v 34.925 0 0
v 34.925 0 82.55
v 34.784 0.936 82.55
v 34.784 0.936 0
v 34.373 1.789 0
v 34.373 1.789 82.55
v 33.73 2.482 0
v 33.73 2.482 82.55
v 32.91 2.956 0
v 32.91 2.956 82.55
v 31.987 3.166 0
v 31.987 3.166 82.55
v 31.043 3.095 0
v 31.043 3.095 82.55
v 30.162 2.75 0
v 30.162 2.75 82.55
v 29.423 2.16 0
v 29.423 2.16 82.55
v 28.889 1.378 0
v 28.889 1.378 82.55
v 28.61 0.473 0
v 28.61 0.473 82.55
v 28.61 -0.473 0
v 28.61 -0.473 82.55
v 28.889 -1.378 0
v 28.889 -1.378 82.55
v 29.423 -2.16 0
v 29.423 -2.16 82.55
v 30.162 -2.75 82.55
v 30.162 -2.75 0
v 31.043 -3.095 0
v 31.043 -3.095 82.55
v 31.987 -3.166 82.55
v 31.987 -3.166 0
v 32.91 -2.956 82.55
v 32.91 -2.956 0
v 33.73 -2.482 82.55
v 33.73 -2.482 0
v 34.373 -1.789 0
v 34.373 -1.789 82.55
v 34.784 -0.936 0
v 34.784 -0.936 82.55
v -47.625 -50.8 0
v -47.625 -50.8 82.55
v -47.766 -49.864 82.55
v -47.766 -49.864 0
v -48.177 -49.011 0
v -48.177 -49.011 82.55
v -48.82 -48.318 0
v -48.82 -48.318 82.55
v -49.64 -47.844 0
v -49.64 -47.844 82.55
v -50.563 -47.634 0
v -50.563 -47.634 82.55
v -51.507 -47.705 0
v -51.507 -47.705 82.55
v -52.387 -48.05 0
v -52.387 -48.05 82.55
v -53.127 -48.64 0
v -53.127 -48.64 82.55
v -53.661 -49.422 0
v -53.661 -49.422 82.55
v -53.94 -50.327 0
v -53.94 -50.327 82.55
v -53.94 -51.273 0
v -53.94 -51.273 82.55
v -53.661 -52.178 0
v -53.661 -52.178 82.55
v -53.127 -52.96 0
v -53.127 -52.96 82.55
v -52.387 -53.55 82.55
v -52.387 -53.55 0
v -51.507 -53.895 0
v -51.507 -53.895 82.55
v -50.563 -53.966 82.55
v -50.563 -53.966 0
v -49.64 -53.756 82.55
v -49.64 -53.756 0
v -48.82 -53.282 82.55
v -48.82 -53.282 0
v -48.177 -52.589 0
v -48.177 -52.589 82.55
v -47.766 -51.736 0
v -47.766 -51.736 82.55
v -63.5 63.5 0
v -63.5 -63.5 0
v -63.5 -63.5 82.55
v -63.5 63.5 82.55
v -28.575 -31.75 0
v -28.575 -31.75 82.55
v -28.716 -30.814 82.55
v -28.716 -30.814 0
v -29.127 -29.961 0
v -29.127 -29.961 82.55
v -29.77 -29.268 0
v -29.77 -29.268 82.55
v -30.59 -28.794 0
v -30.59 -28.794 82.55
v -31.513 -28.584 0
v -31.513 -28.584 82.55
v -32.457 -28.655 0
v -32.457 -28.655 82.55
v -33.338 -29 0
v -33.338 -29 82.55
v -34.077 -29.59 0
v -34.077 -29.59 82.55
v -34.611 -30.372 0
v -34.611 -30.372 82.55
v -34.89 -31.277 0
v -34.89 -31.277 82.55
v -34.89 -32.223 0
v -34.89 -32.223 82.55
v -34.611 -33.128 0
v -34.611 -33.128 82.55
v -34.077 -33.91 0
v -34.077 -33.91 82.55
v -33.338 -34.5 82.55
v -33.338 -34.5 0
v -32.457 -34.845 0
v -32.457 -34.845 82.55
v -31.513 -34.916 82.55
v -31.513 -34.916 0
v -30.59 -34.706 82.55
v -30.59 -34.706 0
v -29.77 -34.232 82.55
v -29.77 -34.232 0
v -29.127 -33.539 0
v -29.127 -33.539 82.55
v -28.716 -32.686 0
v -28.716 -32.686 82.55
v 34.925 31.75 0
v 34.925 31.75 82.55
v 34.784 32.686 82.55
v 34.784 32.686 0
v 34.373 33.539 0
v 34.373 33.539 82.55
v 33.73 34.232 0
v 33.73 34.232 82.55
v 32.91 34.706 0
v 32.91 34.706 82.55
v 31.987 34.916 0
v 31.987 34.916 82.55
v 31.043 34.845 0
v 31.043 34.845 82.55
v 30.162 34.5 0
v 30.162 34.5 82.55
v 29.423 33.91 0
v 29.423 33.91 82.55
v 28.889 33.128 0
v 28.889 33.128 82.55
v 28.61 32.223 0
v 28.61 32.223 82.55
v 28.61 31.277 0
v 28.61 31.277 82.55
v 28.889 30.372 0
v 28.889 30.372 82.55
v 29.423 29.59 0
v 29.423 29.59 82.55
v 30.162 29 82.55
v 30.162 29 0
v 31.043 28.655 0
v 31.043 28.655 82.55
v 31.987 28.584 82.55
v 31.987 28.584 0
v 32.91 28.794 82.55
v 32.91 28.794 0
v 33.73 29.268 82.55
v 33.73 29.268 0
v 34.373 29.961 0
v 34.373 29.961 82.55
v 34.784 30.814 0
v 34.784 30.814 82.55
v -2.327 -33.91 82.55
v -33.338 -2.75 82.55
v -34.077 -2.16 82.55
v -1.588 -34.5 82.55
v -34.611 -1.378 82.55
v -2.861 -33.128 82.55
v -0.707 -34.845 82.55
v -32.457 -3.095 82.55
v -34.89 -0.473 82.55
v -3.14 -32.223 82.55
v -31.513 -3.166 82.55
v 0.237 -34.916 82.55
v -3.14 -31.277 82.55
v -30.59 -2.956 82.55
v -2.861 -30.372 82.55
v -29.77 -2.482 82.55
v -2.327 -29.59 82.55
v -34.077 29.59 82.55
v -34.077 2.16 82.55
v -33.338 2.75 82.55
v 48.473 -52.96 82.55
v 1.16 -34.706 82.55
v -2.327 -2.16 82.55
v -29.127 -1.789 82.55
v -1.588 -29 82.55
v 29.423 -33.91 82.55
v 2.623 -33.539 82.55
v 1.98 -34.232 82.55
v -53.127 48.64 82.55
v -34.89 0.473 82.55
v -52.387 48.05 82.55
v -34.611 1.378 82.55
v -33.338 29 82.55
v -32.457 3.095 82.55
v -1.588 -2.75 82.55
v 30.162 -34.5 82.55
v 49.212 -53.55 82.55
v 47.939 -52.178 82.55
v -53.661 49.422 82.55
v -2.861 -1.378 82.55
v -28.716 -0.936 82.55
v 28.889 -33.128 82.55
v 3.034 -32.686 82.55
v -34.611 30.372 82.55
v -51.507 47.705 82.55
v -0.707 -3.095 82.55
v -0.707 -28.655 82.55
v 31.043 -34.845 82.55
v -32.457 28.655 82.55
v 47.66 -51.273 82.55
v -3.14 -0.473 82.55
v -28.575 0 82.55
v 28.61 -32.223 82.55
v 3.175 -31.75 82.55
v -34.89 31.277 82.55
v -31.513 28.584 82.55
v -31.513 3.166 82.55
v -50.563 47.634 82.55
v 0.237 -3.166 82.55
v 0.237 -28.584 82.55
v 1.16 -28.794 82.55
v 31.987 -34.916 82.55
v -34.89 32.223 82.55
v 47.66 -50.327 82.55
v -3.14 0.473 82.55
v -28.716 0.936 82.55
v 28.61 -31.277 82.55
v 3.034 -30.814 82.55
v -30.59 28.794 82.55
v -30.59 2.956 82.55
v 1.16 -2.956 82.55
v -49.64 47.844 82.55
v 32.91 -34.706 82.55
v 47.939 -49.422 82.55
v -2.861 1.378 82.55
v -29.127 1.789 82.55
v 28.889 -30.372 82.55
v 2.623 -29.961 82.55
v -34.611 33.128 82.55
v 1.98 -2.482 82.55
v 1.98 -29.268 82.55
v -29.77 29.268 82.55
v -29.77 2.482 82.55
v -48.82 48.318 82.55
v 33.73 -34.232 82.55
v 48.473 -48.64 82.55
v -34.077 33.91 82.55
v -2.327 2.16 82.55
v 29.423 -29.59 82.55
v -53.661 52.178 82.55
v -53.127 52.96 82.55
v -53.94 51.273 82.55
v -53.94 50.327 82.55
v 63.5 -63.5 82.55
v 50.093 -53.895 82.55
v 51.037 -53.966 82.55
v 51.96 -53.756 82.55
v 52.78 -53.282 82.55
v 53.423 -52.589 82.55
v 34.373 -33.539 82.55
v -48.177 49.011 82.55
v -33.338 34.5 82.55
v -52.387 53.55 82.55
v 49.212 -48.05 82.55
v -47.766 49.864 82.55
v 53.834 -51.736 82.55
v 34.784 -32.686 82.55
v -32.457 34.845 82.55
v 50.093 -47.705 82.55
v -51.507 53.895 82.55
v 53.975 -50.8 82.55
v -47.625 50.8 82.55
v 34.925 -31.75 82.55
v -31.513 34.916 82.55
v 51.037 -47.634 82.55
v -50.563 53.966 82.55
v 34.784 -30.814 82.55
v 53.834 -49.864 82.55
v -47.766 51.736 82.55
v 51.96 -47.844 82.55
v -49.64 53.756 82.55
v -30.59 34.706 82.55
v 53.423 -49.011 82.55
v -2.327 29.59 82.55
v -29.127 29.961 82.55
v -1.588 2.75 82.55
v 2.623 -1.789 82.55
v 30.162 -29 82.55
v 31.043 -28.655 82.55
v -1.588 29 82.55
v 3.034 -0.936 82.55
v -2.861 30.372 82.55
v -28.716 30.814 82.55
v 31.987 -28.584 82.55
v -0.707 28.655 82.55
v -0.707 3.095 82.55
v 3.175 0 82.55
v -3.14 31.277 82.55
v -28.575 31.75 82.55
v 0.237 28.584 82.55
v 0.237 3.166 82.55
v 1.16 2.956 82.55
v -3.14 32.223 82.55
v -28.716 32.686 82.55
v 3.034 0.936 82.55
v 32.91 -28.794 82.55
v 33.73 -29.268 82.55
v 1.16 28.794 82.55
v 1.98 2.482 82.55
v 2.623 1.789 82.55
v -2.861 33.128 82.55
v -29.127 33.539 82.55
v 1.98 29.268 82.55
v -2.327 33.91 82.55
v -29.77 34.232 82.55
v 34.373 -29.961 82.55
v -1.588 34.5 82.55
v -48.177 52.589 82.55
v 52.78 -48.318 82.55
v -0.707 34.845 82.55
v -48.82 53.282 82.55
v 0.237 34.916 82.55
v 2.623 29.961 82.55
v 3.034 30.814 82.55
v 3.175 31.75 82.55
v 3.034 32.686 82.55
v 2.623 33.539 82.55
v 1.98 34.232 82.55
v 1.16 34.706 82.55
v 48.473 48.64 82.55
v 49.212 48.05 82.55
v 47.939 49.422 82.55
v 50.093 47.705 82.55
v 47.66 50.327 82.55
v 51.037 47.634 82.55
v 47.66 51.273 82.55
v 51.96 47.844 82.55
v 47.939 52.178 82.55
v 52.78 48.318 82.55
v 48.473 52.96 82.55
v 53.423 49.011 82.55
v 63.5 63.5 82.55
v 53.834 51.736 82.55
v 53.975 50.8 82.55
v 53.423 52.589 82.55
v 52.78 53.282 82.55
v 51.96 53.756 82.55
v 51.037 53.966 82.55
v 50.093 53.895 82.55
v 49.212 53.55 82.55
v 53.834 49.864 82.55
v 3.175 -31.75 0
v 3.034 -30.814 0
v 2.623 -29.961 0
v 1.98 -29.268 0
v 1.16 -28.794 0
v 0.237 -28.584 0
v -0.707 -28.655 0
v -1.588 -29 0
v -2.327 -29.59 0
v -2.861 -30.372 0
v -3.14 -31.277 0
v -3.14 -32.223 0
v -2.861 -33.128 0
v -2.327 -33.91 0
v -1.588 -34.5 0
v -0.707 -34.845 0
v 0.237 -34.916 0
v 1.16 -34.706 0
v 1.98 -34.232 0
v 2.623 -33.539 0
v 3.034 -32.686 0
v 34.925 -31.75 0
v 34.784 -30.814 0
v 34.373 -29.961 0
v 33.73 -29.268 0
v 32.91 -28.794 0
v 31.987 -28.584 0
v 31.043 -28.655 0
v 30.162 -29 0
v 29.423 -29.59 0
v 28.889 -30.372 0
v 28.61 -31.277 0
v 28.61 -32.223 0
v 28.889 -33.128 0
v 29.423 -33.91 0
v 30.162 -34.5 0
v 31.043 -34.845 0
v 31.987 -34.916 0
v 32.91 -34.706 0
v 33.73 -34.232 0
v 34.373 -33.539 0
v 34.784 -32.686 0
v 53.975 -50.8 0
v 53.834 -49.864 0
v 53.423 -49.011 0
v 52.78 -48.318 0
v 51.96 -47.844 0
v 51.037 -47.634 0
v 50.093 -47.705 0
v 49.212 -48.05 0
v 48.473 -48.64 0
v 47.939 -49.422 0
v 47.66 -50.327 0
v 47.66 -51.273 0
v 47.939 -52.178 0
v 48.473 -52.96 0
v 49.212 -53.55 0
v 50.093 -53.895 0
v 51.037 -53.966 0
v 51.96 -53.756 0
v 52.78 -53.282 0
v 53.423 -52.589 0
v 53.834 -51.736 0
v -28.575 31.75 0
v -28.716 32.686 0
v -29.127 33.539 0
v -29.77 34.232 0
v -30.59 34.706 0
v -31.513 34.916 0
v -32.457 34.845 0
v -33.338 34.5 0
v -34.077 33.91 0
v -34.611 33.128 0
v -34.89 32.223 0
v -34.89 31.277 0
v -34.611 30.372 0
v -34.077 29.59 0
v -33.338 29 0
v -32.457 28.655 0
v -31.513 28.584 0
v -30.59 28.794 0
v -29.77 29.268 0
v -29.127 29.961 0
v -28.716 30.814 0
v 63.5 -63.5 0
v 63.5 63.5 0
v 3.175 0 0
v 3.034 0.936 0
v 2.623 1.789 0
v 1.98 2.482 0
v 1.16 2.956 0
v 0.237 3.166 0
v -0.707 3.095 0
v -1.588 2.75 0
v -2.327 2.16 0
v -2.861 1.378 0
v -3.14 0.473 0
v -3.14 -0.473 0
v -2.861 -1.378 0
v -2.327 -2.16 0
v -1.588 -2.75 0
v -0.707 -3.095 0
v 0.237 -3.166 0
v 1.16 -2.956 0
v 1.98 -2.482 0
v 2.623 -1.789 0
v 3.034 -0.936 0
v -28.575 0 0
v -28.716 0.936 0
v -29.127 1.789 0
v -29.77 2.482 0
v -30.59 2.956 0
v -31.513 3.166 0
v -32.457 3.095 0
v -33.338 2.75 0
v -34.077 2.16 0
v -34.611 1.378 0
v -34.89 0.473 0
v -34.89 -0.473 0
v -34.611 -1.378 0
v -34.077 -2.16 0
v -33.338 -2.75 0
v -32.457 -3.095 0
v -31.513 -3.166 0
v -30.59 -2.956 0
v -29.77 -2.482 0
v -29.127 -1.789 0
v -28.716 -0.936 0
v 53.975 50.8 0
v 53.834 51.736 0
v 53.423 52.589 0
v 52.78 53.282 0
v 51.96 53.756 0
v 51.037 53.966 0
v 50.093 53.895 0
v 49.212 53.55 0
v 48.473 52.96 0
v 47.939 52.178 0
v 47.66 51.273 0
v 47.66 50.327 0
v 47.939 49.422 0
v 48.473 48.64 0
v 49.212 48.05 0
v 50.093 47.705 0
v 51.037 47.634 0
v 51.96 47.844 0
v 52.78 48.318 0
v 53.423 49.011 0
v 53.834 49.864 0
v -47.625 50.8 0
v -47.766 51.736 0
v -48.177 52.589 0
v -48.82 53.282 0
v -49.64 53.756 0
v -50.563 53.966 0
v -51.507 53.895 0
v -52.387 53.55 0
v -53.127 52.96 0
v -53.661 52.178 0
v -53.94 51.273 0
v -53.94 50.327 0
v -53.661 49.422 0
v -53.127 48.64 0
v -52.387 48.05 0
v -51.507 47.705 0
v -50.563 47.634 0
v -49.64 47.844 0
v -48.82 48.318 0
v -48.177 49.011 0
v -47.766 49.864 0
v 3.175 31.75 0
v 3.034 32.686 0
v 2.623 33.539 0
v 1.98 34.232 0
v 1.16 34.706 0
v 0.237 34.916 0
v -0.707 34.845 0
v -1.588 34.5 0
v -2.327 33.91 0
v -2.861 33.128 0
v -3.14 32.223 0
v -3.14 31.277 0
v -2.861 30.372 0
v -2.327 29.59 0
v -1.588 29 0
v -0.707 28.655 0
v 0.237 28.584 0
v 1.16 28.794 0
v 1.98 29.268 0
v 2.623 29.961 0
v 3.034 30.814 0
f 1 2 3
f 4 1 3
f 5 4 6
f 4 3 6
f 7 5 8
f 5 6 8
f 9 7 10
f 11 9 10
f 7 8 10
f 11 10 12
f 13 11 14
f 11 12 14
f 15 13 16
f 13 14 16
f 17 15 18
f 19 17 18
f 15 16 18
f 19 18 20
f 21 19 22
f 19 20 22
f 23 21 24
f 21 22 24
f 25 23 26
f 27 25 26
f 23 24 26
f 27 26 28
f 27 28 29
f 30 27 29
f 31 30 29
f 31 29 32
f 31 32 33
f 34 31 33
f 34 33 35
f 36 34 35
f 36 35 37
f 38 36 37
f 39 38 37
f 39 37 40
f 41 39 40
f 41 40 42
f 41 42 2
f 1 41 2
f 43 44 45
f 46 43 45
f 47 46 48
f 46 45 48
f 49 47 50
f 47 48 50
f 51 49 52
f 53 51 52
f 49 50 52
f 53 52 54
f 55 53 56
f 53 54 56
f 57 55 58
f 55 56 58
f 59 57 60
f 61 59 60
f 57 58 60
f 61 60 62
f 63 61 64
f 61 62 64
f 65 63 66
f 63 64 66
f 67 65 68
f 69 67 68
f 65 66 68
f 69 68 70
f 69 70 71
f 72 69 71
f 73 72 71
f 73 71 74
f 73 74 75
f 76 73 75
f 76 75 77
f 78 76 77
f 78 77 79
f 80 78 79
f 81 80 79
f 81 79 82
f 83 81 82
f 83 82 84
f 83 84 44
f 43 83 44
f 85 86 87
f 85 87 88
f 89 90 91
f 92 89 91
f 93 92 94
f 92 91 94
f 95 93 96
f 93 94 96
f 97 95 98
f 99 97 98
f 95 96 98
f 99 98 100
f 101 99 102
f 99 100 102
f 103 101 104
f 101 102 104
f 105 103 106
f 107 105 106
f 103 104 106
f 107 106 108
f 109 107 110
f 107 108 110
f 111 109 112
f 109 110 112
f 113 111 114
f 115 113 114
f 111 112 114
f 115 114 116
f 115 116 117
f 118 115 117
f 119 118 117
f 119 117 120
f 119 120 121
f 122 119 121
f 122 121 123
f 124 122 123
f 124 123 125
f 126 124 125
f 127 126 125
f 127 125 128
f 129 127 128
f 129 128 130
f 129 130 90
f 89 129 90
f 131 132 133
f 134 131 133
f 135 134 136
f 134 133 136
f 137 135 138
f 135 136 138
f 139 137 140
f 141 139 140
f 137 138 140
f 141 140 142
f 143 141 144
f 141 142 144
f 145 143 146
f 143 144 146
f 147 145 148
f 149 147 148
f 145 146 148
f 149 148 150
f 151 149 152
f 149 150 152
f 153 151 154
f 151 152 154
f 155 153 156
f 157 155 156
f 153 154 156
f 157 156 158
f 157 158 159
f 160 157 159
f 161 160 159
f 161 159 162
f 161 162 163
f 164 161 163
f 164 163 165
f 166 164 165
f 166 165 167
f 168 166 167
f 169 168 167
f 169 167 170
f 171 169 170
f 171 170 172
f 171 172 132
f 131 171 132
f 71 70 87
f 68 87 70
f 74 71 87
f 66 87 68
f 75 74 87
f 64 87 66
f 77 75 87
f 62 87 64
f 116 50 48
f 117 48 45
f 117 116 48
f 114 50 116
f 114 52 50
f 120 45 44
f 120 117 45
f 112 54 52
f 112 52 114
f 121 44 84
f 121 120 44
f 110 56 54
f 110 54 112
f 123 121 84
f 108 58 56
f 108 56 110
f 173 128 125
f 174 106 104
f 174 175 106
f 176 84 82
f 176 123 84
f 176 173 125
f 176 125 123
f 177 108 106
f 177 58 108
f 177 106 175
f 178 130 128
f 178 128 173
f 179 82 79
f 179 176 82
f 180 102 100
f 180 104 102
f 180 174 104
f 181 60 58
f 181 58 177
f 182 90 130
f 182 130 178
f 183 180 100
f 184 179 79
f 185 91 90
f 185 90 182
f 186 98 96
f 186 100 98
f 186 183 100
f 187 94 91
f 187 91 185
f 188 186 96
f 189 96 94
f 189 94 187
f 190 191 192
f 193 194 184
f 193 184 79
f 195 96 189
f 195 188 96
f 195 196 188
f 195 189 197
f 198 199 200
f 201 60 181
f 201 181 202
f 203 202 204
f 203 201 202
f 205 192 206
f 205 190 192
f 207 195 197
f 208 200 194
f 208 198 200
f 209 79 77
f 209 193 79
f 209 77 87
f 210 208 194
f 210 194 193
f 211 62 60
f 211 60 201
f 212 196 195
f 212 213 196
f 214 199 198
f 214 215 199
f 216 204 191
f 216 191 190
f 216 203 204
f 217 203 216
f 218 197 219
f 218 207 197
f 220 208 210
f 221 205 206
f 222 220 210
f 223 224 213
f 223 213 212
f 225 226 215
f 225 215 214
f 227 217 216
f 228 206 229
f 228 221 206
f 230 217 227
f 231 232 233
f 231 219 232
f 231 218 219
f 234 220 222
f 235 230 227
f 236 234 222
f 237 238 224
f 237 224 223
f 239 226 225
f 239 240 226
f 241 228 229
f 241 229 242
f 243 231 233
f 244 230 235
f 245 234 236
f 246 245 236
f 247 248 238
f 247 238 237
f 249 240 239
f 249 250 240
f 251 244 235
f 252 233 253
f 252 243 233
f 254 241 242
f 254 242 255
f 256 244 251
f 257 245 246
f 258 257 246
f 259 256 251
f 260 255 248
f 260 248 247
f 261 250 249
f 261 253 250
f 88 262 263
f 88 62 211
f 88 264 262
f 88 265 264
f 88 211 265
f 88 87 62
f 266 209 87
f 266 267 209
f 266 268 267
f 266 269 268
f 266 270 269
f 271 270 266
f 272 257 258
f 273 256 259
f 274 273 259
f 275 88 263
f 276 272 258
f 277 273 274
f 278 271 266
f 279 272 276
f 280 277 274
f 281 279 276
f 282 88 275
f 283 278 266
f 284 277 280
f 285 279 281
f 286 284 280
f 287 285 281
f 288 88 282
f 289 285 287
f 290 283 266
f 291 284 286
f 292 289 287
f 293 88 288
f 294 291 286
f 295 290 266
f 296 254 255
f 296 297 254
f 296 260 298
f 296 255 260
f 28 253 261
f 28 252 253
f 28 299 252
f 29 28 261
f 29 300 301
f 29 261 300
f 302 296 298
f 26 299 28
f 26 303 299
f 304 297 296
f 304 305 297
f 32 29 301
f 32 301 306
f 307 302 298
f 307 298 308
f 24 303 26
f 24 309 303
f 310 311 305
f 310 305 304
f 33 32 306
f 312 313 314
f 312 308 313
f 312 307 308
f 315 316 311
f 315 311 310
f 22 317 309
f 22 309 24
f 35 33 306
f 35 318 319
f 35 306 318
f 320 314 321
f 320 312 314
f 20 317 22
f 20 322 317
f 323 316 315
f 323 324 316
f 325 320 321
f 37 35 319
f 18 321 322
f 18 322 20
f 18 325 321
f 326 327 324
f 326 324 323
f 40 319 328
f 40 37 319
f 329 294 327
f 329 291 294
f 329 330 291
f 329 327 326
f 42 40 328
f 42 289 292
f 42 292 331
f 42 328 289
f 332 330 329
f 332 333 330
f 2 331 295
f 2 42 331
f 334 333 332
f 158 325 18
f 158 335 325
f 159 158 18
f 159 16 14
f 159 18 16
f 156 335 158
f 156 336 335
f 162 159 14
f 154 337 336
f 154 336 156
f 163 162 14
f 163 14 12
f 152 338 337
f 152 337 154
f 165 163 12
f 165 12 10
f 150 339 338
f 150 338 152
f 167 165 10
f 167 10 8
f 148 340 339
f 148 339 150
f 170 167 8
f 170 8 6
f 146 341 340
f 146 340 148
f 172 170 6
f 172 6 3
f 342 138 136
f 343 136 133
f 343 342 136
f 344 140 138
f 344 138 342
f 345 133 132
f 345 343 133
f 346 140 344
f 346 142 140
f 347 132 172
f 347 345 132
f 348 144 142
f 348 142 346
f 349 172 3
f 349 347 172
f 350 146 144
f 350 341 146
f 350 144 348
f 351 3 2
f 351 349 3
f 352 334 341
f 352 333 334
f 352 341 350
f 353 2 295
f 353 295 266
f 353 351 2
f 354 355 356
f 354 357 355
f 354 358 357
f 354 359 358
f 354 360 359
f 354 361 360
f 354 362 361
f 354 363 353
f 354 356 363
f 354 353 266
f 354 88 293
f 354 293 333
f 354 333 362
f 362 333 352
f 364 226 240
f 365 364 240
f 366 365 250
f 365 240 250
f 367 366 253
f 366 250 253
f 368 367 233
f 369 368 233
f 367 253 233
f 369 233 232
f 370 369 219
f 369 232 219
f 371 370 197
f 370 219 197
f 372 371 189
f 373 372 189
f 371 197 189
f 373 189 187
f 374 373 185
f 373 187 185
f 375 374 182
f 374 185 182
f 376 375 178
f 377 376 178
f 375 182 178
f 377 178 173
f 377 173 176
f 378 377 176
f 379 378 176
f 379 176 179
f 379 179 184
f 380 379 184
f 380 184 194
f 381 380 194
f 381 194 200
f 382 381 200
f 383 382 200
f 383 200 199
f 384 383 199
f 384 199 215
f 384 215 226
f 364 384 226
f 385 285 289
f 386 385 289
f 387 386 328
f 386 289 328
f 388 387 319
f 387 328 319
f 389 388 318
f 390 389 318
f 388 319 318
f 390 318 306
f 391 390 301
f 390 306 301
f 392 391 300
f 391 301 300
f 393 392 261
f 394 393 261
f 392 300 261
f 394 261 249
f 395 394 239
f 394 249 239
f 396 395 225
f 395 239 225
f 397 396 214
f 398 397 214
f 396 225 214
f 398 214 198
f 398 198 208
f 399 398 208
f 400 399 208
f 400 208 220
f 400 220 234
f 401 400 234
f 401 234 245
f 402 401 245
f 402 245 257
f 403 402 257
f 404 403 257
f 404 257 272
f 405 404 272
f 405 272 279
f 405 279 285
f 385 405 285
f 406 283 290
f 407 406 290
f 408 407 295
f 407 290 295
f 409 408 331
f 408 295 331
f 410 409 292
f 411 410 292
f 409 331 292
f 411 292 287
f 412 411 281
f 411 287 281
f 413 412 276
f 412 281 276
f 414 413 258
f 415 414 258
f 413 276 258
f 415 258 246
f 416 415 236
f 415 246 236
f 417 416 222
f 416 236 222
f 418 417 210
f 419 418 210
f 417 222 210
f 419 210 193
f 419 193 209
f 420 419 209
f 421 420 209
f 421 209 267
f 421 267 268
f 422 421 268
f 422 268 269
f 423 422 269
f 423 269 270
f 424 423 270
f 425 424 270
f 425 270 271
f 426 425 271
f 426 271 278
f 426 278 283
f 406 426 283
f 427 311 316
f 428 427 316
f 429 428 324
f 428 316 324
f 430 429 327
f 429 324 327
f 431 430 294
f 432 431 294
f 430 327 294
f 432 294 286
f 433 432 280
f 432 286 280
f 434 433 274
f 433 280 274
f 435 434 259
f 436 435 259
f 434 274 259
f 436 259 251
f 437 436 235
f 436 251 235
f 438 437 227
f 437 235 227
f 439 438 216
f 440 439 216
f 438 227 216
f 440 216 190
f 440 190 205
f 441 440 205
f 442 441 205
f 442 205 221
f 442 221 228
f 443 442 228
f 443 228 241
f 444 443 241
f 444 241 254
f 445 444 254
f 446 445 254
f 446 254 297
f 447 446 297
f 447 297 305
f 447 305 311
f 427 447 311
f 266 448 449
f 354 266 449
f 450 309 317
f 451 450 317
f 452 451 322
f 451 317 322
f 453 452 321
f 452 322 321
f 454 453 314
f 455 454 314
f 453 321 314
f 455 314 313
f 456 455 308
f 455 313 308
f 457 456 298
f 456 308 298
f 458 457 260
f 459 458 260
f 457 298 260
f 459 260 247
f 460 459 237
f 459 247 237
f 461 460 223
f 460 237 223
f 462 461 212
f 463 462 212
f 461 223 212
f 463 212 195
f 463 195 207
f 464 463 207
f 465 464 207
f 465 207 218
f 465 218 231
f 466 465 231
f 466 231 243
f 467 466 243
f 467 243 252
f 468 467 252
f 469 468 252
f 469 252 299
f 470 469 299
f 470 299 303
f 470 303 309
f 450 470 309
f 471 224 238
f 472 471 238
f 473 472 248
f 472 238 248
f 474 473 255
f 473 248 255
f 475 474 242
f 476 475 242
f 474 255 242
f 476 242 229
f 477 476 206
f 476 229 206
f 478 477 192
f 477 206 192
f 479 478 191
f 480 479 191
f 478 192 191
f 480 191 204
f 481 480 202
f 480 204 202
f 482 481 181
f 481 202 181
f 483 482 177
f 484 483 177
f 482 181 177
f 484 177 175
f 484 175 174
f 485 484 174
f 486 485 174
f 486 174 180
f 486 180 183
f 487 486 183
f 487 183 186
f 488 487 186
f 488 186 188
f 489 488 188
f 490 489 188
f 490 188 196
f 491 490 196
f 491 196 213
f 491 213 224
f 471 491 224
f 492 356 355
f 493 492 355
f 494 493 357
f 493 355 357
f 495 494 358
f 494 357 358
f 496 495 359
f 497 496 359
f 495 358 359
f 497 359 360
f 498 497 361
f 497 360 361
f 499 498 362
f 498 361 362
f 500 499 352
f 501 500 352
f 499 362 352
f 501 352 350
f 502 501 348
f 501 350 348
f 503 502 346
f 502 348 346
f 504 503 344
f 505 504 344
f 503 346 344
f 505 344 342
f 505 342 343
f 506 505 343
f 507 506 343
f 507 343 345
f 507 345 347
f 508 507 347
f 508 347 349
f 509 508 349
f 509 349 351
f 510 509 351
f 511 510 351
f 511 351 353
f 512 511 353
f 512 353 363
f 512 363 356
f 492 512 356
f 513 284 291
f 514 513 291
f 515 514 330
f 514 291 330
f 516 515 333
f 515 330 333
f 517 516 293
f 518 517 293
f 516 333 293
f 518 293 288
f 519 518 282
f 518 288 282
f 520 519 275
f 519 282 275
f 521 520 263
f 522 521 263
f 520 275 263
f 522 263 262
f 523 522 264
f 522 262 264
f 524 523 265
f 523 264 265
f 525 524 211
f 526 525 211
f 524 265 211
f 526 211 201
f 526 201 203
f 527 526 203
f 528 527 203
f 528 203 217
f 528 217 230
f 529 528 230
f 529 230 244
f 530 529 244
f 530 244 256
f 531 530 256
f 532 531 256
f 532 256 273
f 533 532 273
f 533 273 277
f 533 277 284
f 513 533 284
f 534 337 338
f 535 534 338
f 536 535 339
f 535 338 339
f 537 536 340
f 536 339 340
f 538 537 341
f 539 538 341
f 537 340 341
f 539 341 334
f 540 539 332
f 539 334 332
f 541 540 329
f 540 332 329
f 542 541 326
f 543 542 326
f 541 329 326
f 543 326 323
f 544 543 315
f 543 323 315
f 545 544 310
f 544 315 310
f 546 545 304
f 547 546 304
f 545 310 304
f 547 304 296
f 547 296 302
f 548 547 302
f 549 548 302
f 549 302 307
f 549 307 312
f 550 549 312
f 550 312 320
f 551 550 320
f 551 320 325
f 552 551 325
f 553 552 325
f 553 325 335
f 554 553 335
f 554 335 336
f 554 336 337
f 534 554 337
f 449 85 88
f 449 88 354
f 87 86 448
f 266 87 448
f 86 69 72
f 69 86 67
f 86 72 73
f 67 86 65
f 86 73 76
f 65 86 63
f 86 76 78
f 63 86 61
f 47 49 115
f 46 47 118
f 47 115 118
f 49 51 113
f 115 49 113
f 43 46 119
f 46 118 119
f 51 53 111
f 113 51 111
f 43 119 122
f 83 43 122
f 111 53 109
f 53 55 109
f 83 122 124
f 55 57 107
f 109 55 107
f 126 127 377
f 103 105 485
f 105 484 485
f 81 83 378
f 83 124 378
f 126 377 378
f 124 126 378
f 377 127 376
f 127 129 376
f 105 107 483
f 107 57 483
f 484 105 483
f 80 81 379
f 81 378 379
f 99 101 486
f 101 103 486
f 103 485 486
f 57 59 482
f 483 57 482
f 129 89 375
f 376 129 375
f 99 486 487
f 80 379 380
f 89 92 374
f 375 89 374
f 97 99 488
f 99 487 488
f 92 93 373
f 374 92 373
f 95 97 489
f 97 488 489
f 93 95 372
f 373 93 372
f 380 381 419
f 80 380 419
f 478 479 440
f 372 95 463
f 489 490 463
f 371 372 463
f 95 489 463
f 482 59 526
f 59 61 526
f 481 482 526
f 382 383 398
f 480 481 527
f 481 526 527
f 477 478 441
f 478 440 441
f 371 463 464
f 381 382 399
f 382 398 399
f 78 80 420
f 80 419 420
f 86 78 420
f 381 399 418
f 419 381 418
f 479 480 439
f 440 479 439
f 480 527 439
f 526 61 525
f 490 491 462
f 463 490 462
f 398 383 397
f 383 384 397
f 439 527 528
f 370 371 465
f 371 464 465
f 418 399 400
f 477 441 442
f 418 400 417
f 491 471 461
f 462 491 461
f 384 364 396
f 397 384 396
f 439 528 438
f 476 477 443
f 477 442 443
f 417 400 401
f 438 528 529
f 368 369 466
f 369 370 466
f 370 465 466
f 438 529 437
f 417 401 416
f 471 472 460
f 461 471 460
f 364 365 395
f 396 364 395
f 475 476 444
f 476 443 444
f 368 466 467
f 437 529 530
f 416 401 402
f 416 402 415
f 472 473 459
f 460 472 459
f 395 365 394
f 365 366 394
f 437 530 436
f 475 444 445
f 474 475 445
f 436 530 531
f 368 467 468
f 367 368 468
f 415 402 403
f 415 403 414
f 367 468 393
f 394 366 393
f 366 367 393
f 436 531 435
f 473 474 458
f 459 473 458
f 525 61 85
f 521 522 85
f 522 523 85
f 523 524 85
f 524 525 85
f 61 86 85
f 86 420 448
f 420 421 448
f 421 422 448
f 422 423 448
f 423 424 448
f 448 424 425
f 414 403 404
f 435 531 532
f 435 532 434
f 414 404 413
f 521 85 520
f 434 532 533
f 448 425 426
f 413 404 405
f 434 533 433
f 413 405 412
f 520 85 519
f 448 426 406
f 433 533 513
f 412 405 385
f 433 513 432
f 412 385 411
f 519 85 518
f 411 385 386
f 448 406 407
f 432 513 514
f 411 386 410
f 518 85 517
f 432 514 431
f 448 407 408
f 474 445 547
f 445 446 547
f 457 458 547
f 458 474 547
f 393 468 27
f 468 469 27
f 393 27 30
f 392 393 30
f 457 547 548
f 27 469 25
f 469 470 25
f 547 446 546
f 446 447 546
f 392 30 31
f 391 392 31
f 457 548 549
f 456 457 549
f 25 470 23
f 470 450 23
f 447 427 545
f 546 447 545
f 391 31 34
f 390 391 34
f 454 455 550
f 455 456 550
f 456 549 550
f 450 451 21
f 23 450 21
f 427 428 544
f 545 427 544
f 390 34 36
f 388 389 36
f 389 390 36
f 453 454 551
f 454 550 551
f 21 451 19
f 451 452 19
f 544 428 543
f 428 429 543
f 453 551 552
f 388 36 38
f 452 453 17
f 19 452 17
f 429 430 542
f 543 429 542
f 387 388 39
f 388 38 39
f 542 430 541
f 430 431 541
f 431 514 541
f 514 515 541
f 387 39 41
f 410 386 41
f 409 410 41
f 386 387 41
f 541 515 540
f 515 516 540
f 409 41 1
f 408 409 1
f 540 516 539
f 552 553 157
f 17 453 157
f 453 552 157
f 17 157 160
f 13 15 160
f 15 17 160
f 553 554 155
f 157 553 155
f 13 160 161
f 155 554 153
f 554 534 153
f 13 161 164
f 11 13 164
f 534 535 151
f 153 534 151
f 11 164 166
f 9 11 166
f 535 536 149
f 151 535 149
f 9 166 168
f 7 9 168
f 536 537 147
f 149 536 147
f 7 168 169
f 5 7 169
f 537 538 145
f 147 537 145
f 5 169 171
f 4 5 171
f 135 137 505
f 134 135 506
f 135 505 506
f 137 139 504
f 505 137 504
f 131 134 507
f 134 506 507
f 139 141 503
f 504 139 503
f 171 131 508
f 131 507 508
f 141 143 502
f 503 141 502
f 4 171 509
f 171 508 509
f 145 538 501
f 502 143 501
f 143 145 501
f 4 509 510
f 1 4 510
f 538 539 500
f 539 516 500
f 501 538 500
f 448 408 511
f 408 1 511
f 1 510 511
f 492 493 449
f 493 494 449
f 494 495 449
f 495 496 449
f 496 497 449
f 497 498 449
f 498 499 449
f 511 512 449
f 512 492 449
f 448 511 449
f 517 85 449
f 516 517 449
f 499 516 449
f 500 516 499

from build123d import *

# Parameters (mm, degrees)
SKETCH1_W                     = 127
SKETCH1_H                     = 127
BOSS_EXTRUDE1_DEPTH           = 82.55
SKETCH2_R                     = 3.175
CUT_EXTRUDE1_DEPTH            = 83.55
LPATTERN1_COUNT               = 2
LPATTERN1_PITCH               = 31.75
LPATTERN1_COL_COUNT           = 2
LPATTERN1_COL_PITCH           = 31.75
LPATTERN2_COUNT               = 2
LPATTERN2_PITCH               = 31.75
LPATTERN2_COPY_1_SKETCH_R     = 3.175
LPATTERN2_COPY_1_DEPTH        = 83.55
LPATTERN2_COPY_2_SKETCH_R     = 3.175
LPATTERN2_COPY_2_DEPTH        = 83.55
LPATTERN2_COL_COUNT           = 2
LPATTERN2_COL_PITCH           = 31.75
LPATTERN2_COL_COPY_1_SKETCH_R = 3.175
LPATTERN2_COL_COPY_1_DEPTH    = 83.55
LPATTERN2_COL_COPY_2_SKETCH_R = 3.175
LPATTERN2_COL_COPY_2_DEPTH    = 83.55
SKETCH3_R                     = 3.175
CUT_EXTRUDE2_DEPTH            = 83.55


with BuildPart() as part:
    # Sketch1 → Boss-Extrude1 (new body)
    with BuildSketch(Plane.XY):
        Rectangle(SKETCH1_W, SKETCH1_H)
    extrude(amount=BOSS_EXTRUDE1_DEPTH)

    # Sketch2 → Cut-Extrude1 (cut, through all)
    with BuildSketch(Plane.XY.offset(82.55)):
        Circle(SKETCH2_R)
    cut_extrude1 = extrude(amount=-CUT_EXTRUDE1_DEPTH, mode=Mode.SUBTRACT)

    # LPattern1: Cut-Extrude1 ×2
    with Locations(*[(-i * LPATTERN1_PITCH, 0, 0) for i in range(1, LPATTERN1_COUNT)]):
        add(cut_extrude1, mode=Mode.SUBTRACT)

    # LPattern1 col: Cut-Extrude1 ×2
    with Locations(*[(i * LPATTERN1_COL_PITCH, 0, 0) for i in range(1, LPATTERN1_COL_COUNT)]):
        add(cut_extrude1, mode=Mode.SUBTRACT)

    # LPattern2: Cut-Extrude1 ×2
    with Locations(*[(0, -i * LPATTERN2_PITCH, 0) for i in range(1, LPATTERN2_COUNT)]):
        add(cut_extrude1, mode=Mode.SUBTRACT)

    # LPattern2 copy 1 sketch → LPattern2 copy 1 (cut, through all)
    with BuildSketch(Plane(origin=(-31.75, -31.75, 82.55), x_dir=(1, 0, 0), z_dir=(0, 0, 1))):
        Circle(LPATTERN2_COPY_1_SKETCH_R)
    extrude(amount=-LPATTERN2_COPY_1_DEPTH, mode=Mode.SUBTRACT)

    # LPattern2 copy 2 sketch → LPattern2 copy 2 (cut, through all)
    with BuildSketch(Plane(origin=(31.75, -31.75, 82.55), x_dir=(1, 0, 0), z_dir=(0, 0, 1))):
        Circle(LPATTERN2_COPY_2_SKETCH_R)
    extrude(amount=-LPATTERN2_COPY_2_DEPTH, mode=Mode.SUBTRACT)

    # LPattern2 col: Cut-Extrude1 ×2
    with Locations(*[(0, i * LPATTERN2_COL_PITCH, 0) for i in range(1, LPATTERN2_COL_COUNT)]):
        add(cut_extrude1, mode=Mode.SUBTRACT)

    # LPattern2 col copy 1 sketch → LPattern2 col copy 1 (cut, through all)
    with BuildSketch(Plane(origin=(-31.75, 31.75, 82.55), x_dir=(1, 0, 0), z_dir=(0, 0, 1))):
        Circle(LPATTERN2_COL_COPY_1_SKETCH_R)
    extrude(amount=-LPATTERN2_COL_COPY_1_DEPTH, mode=Mode.SUBTRACT)

    # LPattern2 col copy 2 sketch → LPattern2 col copy 2 (cut, through all)
    with BuildSketch(Plane(origin=(31.75, 31.75, 82.55), x_dir=(1, 0, 0), z_dir=(0, 0, 1))):
        Circle(LPATTERN2_COL_COPY_2_SKETCH_R)
    extrude(amount=-LPATTERN2_COL_COPY_2_DEPTH, mode=Mode.SUBTRACT)

    # Sketch3 → Cut-Extrude2 (cut, through all)
    with BuildSketch(Plane.XY.offset(82.55)):
        with Locations((-50.8, 50.8)):
            Circle(SKETCH3_R)
        with Locations((50.8, 50.8)):
            Circle(SKETCH3_R)
        with Locations((50.8, -50.8)):
            Circle(SKETCH3_R)
        with Locations((-50.8, -50.8)):
            Circle(SKETCH3_R)
    extrude(amount=-CUT_EXTRUDE2_DEPTH, mode=Mode.SUBTRACT)


solid = part.part
